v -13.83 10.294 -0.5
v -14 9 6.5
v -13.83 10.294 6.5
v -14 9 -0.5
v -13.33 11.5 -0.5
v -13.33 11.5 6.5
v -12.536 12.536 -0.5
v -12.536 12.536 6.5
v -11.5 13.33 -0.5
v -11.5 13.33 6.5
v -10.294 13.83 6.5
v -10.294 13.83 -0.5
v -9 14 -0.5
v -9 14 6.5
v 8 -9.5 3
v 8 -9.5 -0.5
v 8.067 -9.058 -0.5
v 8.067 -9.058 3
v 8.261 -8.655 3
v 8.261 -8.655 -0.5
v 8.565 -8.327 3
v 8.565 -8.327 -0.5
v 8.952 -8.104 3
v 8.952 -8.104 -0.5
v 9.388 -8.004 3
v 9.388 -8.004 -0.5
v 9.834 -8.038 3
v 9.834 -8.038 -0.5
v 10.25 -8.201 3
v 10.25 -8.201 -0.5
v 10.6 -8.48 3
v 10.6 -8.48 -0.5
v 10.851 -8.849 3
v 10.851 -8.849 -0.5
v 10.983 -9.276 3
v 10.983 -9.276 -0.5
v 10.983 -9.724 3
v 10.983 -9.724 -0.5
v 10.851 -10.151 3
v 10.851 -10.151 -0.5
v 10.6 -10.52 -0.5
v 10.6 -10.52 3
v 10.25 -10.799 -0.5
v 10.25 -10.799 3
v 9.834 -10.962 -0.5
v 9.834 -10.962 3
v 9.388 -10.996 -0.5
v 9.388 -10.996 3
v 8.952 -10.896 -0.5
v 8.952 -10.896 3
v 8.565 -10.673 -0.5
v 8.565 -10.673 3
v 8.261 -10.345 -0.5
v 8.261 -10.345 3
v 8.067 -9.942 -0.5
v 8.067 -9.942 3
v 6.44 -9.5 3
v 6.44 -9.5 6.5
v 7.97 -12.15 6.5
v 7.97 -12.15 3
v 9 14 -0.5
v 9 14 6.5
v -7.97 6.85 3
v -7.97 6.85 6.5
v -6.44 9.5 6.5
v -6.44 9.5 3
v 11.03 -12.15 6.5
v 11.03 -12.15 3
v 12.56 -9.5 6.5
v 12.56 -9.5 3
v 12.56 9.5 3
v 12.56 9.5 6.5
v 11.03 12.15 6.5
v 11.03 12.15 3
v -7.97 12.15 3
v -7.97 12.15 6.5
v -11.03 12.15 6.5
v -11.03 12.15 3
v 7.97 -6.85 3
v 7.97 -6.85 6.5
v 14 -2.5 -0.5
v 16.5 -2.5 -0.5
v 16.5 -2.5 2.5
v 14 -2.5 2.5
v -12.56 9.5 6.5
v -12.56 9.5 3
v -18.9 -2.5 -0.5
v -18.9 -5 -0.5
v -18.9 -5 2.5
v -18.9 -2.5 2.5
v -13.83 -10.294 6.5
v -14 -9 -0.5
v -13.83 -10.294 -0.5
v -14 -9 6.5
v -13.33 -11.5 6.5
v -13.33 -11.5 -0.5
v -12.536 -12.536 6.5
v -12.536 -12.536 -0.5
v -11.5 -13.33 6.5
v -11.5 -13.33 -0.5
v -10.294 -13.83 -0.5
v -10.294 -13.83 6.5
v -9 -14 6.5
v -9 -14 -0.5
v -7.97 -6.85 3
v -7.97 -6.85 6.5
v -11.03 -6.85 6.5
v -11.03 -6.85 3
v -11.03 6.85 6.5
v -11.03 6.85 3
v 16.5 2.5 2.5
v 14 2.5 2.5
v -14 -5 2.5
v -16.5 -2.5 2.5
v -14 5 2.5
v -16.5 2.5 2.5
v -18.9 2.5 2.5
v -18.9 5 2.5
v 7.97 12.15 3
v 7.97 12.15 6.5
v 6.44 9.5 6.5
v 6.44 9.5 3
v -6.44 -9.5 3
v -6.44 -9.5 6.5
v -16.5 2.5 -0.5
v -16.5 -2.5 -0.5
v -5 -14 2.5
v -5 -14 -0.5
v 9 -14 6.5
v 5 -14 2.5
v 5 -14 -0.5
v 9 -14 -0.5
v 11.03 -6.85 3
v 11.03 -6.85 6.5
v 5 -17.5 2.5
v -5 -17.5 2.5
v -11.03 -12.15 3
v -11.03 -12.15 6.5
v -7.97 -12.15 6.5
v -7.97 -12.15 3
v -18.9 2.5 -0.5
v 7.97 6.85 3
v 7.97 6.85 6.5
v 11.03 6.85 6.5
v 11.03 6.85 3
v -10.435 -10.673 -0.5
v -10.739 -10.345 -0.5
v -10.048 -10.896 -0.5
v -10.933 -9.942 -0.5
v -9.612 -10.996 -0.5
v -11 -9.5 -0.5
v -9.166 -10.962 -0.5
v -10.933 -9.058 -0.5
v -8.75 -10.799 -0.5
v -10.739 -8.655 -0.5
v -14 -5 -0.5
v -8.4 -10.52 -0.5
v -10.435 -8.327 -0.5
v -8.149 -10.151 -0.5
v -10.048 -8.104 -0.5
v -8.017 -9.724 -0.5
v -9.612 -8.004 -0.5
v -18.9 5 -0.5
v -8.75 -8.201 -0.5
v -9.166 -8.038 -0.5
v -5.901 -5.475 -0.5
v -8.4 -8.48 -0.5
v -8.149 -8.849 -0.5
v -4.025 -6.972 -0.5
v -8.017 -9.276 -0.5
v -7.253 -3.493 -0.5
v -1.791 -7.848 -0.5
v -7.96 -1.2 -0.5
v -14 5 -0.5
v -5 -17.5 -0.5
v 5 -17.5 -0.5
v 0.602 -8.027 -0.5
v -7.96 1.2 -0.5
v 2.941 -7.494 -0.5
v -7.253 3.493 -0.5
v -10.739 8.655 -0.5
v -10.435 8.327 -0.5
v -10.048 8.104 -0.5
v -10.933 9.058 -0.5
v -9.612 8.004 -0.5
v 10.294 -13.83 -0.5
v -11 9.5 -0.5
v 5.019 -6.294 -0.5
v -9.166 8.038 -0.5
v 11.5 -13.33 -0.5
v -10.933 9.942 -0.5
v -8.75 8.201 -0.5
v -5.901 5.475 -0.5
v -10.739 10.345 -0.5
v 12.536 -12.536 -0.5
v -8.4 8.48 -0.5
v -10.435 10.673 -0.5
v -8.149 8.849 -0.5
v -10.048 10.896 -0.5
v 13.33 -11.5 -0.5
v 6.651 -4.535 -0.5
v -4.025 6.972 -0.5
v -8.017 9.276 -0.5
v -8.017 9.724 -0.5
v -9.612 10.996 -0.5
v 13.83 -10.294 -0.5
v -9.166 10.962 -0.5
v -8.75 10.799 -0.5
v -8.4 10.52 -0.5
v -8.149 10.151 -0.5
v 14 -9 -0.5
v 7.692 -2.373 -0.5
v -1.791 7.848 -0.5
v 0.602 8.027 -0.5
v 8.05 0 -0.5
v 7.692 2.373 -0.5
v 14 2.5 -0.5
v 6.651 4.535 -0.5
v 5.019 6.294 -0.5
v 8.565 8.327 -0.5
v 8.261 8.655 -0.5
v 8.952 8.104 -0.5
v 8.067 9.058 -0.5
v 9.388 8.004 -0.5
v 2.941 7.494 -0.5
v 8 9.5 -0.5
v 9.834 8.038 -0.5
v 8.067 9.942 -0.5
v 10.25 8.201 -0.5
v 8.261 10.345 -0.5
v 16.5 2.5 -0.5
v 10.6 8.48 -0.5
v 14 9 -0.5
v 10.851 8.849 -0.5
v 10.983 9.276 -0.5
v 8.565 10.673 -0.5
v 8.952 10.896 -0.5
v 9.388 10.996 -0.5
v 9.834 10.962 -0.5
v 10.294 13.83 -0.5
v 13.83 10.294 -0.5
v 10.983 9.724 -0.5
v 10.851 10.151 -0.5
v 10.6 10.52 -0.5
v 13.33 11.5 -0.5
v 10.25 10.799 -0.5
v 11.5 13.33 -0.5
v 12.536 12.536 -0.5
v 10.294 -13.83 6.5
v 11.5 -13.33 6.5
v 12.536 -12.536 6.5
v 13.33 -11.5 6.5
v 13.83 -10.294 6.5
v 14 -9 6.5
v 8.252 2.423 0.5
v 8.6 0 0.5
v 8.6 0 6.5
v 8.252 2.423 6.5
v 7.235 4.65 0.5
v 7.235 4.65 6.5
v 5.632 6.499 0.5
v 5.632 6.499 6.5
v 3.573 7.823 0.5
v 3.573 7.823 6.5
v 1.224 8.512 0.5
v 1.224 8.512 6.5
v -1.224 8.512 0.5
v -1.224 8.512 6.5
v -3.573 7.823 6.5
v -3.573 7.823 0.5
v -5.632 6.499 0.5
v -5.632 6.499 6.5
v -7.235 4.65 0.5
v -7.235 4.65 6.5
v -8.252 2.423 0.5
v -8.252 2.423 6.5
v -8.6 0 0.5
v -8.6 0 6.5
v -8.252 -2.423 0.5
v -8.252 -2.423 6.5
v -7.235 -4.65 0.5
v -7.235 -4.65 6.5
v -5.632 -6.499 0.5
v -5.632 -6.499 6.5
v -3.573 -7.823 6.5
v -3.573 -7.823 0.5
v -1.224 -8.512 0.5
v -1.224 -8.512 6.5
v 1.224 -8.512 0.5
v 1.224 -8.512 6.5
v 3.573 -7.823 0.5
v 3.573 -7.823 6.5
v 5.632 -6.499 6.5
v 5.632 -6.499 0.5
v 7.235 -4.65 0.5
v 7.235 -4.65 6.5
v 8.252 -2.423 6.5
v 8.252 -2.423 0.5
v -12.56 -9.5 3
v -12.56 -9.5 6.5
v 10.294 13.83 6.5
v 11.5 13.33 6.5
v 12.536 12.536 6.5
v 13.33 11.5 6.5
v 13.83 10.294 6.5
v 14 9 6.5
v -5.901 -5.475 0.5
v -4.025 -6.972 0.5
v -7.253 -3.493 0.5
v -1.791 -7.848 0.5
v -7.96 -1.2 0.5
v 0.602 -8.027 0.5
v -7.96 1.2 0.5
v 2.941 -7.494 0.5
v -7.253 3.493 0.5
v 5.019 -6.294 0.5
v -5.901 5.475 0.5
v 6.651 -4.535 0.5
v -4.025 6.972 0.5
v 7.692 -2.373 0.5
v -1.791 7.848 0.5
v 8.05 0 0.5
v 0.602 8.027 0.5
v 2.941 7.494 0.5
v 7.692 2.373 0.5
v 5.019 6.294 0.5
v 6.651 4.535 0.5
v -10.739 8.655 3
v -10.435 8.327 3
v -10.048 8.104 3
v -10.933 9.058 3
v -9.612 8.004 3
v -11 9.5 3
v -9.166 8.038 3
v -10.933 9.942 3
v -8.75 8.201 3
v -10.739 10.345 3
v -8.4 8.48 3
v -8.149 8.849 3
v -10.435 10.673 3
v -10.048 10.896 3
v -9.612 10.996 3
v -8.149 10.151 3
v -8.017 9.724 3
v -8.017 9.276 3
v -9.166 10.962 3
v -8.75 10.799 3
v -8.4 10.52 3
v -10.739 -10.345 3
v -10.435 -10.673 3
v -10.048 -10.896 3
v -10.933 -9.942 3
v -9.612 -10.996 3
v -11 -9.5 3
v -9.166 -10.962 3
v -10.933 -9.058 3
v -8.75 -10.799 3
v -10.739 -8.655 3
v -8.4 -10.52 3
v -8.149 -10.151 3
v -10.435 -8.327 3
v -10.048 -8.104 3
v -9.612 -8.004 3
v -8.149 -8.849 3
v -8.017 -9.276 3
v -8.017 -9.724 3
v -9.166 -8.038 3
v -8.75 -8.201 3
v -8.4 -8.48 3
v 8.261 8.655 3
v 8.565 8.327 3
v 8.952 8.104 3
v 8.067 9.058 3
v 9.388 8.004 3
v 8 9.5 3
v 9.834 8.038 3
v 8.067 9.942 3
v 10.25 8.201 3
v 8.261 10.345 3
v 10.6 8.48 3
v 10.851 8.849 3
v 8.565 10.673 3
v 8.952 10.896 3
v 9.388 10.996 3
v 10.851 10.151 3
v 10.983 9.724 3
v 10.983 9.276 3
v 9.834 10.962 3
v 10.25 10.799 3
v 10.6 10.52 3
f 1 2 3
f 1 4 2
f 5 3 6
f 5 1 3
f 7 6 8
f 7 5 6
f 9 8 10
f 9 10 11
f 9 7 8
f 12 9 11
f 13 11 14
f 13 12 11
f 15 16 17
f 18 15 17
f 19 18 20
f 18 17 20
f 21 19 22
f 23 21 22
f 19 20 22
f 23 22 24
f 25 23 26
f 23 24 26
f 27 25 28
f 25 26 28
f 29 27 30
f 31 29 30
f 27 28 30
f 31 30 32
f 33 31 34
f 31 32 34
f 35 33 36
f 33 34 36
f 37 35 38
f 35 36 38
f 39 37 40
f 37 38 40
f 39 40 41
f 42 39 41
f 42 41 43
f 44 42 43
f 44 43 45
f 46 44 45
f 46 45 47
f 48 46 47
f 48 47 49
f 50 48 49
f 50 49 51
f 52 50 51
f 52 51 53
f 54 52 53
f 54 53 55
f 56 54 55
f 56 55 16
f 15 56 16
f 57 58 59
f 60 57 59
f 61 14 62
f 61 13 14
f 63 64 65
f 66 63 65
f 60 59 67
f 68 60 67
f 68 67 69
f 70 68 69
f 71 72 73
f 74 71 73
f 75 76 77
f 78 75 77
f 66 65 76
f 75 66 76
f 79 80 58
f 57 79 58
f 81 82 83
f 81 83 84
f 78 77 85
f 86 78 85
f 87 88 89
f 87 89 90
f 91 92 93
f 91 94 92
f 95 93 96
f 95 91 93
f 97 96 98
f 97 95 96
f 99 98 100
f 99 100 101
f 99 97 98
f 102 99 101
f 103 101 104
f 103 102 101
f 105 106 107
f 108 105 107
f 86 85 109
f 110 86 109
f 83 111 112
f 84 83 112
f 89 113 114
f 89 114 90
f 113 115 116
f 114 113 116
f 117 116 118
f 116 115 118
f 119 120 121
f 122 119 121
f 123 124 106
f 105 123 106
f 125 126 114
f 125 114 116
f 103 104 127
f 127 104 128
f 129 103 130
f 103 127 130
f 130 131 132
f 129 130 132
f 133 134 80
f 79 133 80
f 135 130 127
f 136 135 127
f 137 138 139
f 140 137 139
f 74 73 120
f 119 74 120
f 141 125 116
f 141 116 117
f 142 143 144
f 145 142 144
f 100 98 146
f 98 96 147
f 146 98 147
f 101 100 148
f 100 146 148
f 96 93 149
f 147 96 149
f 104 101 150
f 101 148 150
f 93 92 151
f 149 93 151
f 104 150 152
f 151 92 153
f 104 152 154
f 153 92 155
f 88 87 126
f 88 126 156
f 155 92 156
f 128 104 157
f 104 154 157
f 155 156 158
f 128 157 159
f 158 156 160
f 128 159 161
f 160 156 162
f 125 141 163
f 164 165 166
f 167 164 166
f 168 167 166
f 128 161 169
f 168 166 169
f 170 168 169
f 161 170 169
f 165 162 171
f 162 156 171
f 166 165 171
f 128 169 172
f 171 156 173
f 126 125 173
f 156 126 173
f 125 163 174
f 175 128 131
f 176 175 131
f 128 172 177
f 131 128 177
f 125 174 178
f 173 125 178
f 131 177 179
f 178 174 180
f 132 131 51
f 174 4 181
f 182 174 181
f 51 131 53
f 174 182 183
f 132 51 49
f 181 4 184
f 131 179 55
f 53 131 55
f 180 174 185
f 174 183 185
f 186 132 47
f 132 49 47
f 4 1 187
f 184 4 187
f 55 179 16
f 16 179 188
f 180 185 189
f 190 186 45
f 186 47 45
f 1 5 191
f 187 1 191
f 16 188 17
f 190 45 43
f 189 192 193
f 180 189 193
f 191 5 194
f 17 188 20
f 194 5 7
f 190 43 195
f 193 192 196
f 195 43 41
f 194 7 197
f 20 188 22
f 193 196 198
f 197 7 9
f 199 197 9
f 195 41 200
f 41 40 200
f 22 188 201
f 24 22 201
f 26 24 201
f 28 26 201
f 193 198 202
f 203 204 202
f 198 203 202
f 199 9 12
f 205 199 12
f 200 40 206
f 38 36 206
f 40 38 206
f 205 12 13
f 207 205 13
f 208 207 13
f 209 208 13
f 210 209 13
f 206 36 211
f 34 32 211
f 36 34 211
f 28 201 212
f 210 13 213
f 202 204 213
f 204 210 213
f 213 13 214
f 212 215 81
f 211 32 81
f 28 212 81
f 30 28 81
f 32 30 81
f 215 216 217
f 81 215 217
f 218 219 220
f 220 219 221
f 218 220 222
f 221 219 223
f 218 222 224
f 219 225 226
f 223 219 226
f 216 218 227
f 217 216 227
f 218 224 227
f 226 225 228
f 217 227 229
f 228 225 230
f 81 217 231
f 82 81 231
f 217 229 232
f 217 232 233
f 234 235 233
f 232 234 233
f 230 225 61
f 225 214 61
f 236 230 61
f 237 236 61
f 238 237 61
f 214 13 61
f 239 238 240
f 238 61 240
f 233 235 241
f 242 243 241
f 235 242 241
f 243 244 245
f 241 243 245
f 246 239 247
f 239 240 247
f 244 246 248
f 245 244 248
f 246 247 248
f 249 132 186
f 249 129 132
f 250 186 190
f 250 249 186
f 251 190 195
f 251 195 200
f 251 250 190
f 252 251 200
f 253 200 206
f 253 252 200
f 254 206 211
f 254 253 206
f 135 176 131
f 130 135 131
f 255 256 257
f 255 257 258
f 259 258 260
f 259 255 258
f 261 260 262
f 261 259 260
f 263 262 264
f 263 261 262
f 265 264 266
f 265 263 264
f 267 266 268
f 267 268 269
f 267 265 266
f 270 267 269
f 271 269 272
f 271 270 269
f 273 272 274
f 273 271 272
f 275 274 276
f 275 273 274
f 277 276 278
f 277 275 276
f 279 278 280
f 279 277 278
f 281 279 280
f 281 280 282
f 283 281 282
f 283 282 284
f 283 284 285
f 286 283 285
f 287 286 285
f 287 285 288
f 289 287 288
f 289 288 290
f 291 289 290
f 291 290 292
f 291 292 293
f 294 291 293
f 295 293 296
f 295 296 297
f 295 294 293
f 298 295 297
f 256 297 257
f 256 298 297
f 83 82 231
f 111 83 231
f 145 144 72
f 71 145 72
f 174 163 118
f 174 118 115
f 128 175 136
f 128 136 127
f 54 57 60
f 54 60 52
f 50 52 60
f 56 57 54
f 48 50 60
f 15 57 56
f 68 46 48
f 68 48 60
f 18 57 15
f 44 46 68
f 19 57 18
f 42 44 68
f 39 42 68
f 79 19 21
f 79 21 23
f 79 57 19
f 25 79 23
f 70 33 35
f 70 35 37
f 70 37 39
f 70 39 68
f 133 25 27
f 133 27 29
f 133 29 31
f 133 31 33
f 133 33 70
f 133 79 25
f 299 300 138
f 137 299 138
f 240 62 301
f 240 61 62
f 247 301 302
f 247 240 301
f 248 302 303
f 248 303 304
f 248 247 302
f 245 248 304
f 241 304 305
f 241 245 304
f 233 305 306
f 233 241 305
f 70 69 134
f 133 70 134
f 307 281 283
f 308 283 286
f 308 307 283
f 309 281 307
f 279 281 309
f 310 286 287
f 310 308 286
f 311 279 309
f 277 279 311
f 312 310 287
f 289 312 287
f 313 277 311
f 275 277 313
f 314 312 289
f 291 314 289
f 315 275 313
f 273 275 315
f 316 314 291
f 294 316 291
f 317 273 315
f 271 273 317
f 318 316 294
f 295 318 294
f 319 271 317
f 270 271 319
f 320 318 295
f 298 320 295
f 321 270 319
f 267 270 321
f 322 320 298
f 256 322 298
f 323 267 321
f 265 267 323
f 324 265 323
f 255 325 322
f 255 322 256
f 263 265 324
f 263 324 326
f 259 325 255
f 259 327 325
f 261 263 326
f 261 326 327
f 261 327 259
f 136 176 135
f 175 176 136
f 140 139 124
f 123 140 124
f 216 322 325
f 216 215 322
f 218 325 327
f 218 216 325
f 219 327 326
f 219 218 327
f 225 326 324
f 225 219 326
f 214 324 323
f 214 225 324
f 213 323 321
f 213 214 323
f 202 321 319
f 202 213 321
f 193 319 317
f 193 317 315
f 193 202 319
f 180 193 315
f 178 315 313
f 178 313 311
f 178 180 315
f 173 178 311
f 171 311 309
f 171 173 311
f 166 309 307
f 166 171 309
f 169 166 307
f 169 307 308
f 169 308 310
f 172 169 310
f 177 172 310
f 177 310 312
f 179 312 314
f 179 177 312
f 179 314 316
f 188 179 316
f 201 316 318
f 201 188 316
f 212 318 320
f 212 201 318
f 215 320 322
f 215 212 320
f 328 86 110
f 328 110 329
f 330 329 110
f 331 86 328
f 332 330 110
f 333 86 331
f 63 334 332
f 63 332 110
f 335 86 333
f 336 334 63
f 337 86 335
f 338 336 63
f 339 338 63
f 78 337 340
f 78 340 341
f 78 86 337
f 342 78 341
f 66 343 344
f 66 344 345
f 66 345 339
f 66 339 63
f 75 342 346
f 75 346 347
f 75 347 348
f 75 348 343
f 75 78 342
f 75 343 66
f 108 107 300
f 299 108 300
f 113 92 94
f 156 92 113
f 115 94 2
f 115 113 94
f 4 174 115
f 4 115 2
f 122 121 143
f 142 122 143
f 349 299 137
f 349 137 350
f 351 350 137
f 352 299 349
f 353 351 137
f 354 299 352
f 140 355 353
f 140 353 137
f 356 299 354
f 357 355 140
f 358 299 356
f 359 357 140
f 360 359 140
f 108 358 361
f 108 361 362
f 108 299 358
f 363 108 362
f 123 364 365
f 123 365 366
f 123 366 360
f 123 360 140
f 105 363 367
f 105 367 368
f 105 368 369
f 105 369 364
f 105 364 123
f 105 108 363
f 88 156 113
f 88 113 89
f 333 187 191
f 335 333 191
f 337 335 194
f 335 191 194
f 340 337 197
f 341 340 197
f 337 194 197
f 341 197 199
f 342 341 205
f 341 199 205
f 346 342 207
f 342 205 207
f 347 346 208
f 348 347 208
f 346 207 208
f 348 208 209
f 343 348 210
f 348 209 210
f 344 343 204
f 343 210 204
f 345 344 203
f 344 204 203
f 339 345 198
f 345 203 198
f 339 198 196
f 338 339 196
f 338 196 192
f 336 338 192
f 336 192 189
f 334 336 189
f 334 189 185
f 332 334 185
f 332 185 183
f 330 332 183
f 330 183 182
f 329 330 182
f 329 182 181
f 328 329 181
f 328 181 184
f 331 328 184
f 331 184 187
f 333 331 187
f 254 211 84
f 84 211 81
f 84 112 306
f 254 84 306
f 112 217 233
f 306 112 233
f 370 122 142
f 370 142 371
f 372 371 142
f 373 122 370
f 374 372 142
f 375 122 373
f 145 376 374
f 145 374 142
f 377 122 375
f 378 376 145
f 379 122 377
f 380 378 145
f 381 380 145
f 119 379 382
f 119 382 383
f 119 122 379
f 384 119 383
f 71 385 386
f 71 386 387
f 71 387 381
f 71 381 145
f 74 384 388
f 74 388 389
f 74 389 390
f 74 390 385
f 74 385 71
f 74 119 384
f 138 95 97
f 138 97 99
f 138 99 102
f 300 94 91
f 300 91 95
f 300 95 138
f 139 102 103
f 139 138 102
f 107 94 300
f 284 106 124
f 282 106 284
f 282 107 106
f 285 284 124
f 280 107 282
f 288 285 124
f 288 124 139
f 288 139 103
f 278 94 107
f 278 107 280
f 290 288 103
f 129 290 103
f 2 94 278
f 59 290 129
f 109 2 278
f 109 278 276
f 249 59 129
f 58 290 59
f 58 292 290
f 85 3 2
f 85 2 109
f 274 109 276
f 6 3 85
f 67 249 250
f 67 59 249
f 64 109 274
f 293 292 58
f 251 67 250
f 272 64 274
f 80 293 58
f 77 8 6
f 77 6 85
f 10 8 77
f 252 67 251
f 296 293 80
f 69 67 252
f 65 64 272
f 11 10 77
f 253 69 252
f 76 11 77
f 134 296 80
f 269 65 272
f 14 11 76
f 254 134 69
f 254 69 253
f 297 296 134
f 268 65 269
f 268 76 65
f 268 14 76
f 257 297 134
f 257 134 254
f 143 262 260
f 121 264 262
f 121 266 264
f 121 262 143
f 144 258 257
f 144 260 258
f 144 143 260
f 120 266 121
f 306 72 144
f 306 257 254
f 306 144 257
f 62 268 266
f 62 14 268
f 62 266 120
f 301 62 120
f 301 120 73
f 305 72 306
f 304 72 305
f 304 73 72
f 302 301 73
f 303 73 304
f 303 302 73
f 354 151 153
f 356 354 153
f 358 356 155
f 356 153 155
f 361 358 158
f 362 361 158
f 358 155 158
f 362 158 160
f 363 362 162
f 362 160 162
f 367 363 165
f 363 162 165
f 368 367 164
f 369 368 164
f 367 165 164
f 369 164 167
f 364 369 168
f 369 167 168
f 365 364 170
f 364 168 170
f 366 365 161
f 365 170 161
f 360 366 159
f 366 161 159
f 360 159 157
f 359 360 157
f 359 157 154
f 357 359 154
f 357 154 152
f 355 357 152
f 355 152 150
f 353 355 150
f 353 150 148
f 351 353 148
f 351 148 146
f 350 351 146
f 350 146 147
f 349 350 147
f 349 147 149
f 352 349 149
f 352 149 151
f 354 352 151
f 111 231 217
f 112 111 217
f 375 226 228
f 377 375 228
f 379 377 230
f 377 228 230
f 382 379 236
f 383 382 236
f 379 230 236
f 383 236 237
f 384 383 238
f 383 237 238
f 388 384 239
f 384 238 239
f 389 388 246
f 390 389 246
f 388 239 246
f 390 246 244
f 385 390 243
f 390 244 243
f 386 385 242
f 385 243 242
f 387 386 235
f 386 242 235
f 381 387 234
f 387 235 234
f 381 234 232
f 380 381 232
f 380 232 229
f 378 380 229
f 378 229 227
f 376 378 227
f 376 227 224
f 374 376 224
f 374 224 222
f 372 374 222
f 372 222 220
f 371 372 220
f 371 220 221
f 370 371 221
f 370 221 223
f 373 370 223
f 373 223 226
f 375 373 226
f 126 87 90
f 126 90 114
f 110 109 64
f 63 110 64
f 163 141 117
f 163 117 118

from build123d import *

# Parameters (mm, degrees)
CROQUIS1_W              = 28
CROQUIS1_H              = 28
CROQUIS1_R              = 8.05
SALIENTE_EXTRUIR1_DEPTH = 0.5
CROQUIS2_W              = 28
CROQUIS2_H              = 28
CROQUIS2_R              = 8.6
SALIENTE_EXTRUIR2_DEPTH = 6
CORTAR_EXTRUIR1_DEPTH   = 3.5
CROQUIS6_R              = 1.5
CORTAR_EXTRUIR2_DEPTH   = 23.5
CROQUIS7_W              = 2.5
CROQUIS7_H              = 5
CROQUIS7_W_2            = 10
CROQUIS7_H_2            = 3.5
SALIENTE_EXTRUIR3_DEPTH = 3
REDONDEO1_R             = 5


with BuildPart() as part:
    # Croquis1 → Saliente-Extruir1 (new, symmetric)
    with BuildSketch(Plane.XY):
        Rectangle(CROQUIS1_W, CROQUIS1_H)
        Circle(CROQUIS1_R, mode=Mode.SUBTRACT)
    extrude(amount=SALIENTE_EXTRUIR1_DEPTH, both=True)

    # Croquis2 → Saliente-Extruir2 (add)
    with BuildSketch(Plane.XY.offset(0.5)):
        Rectangle(CROQUIS2_W, CROQUIS2_H)
        Circle(CROQUIS2_R, mode=Mode.SUBTRACT)
    extrude(amount=SALIENTE_EXTRUIR2_DEPTH)

    # Croquis3 → Cortar-Extruir1 (cut)
    with BuildSketch(Plane.XY.offset(6.5)):
        Polygon((11.029978213, 12.15), (7.970021787, 12.15), (6.440043573, 9.5), (7.970021787, 6.85), (11.029978213, 6.85), (12.559956427, 9.5), align=None)
        Polygon((-6.440043573, 9.5), (-7.970021787, 12.15), (-11.029978213, 12.15), (-12.559956427, 9.5), (-11.029978213, 6.85), (-7.970021787, 6.85), align=None)
        Polygon((-7.970021787, -6.85), (-11.029978213, -6.85), (-12.559956427, -9.5), (-11.029978213, -12.15), (-7.970021787, -12.15), (-6.440043573, -9.5), align=None)
        Polygon((11.029978213, -6.85), (7.970021787, -6.85), (6.440043573, -9.5), (7.970021787, -12.15), (11.029978213, -12.15), (12.559956427, -9.5), align=None)
    extrude(amount=-CORTAR_EXTRUIR1_DEPTH, mode=Mode.SUBTRACT)

    # Croquis6 → Cortar-Extruir2 (cut)
    with BuildSketch(Plane(origin=(0, 0, -0.5), x_dir=(-1, 0, 0), z_dir=(0, 0, -1))):
        with Locations((-9.5, 9.5)):
            Circle(CROQUIS6_R)
        with Locations((9.5, 9.5)):
            Circle(CROQUIS6_R)
        with Locations((9.5, -9.5)):
            Circle(CROQUIS6_R)
        with Locations((-9.5, -9.5)):
            Circle(CROQUIS6_R)
    extrude(amount=-CORTAR_EXTRUIR2_DEPTH, mode=Mode.SUBTRACT)

    # Croquis7 → Saliente-Extruir3 (add)
    with BuildSketch(Plane(origin=(0, 0, -0.5), x_dir=(-1, 0, 0), z_dir=(0, 0, -1))):
        with Locations((-15.25, 0)):
            Rectangle(CROQUIS7_W, CROQUIS7_H)
        with Locations((0, -15.75)):
            Rectangle(CROQUIS7_W_2, CROQUIS7_H_2)
        Polygon((14, -2.5), (14, -5), (18.9, -5), (18.9, -2.5), (16.5, -2.5), align=None)
        with Locations((15.25, 0)):
            Rectangle(CROQUIS7_W, CROQUIS7_H)
        Polygon((14, 5), (14, 2.5), (16.5, 2.5), (18.9, 2.5), (18.9, 5), align=None)
    extrude(amount=-SALIENTE_EXTRUIR3_DEPTH)

    # Redondeo1
    redondeo1_edges = [part.edges().sort_by_distance(p)[0] for p in [
        (14, -14, 3),
        (-14, -14, 3),
        (-14, 14, 3),
        (14, 14, 3),
    ]]
    fillet(redondeo1_edges, radius=REDONDEO1_R)


solid = part.part
